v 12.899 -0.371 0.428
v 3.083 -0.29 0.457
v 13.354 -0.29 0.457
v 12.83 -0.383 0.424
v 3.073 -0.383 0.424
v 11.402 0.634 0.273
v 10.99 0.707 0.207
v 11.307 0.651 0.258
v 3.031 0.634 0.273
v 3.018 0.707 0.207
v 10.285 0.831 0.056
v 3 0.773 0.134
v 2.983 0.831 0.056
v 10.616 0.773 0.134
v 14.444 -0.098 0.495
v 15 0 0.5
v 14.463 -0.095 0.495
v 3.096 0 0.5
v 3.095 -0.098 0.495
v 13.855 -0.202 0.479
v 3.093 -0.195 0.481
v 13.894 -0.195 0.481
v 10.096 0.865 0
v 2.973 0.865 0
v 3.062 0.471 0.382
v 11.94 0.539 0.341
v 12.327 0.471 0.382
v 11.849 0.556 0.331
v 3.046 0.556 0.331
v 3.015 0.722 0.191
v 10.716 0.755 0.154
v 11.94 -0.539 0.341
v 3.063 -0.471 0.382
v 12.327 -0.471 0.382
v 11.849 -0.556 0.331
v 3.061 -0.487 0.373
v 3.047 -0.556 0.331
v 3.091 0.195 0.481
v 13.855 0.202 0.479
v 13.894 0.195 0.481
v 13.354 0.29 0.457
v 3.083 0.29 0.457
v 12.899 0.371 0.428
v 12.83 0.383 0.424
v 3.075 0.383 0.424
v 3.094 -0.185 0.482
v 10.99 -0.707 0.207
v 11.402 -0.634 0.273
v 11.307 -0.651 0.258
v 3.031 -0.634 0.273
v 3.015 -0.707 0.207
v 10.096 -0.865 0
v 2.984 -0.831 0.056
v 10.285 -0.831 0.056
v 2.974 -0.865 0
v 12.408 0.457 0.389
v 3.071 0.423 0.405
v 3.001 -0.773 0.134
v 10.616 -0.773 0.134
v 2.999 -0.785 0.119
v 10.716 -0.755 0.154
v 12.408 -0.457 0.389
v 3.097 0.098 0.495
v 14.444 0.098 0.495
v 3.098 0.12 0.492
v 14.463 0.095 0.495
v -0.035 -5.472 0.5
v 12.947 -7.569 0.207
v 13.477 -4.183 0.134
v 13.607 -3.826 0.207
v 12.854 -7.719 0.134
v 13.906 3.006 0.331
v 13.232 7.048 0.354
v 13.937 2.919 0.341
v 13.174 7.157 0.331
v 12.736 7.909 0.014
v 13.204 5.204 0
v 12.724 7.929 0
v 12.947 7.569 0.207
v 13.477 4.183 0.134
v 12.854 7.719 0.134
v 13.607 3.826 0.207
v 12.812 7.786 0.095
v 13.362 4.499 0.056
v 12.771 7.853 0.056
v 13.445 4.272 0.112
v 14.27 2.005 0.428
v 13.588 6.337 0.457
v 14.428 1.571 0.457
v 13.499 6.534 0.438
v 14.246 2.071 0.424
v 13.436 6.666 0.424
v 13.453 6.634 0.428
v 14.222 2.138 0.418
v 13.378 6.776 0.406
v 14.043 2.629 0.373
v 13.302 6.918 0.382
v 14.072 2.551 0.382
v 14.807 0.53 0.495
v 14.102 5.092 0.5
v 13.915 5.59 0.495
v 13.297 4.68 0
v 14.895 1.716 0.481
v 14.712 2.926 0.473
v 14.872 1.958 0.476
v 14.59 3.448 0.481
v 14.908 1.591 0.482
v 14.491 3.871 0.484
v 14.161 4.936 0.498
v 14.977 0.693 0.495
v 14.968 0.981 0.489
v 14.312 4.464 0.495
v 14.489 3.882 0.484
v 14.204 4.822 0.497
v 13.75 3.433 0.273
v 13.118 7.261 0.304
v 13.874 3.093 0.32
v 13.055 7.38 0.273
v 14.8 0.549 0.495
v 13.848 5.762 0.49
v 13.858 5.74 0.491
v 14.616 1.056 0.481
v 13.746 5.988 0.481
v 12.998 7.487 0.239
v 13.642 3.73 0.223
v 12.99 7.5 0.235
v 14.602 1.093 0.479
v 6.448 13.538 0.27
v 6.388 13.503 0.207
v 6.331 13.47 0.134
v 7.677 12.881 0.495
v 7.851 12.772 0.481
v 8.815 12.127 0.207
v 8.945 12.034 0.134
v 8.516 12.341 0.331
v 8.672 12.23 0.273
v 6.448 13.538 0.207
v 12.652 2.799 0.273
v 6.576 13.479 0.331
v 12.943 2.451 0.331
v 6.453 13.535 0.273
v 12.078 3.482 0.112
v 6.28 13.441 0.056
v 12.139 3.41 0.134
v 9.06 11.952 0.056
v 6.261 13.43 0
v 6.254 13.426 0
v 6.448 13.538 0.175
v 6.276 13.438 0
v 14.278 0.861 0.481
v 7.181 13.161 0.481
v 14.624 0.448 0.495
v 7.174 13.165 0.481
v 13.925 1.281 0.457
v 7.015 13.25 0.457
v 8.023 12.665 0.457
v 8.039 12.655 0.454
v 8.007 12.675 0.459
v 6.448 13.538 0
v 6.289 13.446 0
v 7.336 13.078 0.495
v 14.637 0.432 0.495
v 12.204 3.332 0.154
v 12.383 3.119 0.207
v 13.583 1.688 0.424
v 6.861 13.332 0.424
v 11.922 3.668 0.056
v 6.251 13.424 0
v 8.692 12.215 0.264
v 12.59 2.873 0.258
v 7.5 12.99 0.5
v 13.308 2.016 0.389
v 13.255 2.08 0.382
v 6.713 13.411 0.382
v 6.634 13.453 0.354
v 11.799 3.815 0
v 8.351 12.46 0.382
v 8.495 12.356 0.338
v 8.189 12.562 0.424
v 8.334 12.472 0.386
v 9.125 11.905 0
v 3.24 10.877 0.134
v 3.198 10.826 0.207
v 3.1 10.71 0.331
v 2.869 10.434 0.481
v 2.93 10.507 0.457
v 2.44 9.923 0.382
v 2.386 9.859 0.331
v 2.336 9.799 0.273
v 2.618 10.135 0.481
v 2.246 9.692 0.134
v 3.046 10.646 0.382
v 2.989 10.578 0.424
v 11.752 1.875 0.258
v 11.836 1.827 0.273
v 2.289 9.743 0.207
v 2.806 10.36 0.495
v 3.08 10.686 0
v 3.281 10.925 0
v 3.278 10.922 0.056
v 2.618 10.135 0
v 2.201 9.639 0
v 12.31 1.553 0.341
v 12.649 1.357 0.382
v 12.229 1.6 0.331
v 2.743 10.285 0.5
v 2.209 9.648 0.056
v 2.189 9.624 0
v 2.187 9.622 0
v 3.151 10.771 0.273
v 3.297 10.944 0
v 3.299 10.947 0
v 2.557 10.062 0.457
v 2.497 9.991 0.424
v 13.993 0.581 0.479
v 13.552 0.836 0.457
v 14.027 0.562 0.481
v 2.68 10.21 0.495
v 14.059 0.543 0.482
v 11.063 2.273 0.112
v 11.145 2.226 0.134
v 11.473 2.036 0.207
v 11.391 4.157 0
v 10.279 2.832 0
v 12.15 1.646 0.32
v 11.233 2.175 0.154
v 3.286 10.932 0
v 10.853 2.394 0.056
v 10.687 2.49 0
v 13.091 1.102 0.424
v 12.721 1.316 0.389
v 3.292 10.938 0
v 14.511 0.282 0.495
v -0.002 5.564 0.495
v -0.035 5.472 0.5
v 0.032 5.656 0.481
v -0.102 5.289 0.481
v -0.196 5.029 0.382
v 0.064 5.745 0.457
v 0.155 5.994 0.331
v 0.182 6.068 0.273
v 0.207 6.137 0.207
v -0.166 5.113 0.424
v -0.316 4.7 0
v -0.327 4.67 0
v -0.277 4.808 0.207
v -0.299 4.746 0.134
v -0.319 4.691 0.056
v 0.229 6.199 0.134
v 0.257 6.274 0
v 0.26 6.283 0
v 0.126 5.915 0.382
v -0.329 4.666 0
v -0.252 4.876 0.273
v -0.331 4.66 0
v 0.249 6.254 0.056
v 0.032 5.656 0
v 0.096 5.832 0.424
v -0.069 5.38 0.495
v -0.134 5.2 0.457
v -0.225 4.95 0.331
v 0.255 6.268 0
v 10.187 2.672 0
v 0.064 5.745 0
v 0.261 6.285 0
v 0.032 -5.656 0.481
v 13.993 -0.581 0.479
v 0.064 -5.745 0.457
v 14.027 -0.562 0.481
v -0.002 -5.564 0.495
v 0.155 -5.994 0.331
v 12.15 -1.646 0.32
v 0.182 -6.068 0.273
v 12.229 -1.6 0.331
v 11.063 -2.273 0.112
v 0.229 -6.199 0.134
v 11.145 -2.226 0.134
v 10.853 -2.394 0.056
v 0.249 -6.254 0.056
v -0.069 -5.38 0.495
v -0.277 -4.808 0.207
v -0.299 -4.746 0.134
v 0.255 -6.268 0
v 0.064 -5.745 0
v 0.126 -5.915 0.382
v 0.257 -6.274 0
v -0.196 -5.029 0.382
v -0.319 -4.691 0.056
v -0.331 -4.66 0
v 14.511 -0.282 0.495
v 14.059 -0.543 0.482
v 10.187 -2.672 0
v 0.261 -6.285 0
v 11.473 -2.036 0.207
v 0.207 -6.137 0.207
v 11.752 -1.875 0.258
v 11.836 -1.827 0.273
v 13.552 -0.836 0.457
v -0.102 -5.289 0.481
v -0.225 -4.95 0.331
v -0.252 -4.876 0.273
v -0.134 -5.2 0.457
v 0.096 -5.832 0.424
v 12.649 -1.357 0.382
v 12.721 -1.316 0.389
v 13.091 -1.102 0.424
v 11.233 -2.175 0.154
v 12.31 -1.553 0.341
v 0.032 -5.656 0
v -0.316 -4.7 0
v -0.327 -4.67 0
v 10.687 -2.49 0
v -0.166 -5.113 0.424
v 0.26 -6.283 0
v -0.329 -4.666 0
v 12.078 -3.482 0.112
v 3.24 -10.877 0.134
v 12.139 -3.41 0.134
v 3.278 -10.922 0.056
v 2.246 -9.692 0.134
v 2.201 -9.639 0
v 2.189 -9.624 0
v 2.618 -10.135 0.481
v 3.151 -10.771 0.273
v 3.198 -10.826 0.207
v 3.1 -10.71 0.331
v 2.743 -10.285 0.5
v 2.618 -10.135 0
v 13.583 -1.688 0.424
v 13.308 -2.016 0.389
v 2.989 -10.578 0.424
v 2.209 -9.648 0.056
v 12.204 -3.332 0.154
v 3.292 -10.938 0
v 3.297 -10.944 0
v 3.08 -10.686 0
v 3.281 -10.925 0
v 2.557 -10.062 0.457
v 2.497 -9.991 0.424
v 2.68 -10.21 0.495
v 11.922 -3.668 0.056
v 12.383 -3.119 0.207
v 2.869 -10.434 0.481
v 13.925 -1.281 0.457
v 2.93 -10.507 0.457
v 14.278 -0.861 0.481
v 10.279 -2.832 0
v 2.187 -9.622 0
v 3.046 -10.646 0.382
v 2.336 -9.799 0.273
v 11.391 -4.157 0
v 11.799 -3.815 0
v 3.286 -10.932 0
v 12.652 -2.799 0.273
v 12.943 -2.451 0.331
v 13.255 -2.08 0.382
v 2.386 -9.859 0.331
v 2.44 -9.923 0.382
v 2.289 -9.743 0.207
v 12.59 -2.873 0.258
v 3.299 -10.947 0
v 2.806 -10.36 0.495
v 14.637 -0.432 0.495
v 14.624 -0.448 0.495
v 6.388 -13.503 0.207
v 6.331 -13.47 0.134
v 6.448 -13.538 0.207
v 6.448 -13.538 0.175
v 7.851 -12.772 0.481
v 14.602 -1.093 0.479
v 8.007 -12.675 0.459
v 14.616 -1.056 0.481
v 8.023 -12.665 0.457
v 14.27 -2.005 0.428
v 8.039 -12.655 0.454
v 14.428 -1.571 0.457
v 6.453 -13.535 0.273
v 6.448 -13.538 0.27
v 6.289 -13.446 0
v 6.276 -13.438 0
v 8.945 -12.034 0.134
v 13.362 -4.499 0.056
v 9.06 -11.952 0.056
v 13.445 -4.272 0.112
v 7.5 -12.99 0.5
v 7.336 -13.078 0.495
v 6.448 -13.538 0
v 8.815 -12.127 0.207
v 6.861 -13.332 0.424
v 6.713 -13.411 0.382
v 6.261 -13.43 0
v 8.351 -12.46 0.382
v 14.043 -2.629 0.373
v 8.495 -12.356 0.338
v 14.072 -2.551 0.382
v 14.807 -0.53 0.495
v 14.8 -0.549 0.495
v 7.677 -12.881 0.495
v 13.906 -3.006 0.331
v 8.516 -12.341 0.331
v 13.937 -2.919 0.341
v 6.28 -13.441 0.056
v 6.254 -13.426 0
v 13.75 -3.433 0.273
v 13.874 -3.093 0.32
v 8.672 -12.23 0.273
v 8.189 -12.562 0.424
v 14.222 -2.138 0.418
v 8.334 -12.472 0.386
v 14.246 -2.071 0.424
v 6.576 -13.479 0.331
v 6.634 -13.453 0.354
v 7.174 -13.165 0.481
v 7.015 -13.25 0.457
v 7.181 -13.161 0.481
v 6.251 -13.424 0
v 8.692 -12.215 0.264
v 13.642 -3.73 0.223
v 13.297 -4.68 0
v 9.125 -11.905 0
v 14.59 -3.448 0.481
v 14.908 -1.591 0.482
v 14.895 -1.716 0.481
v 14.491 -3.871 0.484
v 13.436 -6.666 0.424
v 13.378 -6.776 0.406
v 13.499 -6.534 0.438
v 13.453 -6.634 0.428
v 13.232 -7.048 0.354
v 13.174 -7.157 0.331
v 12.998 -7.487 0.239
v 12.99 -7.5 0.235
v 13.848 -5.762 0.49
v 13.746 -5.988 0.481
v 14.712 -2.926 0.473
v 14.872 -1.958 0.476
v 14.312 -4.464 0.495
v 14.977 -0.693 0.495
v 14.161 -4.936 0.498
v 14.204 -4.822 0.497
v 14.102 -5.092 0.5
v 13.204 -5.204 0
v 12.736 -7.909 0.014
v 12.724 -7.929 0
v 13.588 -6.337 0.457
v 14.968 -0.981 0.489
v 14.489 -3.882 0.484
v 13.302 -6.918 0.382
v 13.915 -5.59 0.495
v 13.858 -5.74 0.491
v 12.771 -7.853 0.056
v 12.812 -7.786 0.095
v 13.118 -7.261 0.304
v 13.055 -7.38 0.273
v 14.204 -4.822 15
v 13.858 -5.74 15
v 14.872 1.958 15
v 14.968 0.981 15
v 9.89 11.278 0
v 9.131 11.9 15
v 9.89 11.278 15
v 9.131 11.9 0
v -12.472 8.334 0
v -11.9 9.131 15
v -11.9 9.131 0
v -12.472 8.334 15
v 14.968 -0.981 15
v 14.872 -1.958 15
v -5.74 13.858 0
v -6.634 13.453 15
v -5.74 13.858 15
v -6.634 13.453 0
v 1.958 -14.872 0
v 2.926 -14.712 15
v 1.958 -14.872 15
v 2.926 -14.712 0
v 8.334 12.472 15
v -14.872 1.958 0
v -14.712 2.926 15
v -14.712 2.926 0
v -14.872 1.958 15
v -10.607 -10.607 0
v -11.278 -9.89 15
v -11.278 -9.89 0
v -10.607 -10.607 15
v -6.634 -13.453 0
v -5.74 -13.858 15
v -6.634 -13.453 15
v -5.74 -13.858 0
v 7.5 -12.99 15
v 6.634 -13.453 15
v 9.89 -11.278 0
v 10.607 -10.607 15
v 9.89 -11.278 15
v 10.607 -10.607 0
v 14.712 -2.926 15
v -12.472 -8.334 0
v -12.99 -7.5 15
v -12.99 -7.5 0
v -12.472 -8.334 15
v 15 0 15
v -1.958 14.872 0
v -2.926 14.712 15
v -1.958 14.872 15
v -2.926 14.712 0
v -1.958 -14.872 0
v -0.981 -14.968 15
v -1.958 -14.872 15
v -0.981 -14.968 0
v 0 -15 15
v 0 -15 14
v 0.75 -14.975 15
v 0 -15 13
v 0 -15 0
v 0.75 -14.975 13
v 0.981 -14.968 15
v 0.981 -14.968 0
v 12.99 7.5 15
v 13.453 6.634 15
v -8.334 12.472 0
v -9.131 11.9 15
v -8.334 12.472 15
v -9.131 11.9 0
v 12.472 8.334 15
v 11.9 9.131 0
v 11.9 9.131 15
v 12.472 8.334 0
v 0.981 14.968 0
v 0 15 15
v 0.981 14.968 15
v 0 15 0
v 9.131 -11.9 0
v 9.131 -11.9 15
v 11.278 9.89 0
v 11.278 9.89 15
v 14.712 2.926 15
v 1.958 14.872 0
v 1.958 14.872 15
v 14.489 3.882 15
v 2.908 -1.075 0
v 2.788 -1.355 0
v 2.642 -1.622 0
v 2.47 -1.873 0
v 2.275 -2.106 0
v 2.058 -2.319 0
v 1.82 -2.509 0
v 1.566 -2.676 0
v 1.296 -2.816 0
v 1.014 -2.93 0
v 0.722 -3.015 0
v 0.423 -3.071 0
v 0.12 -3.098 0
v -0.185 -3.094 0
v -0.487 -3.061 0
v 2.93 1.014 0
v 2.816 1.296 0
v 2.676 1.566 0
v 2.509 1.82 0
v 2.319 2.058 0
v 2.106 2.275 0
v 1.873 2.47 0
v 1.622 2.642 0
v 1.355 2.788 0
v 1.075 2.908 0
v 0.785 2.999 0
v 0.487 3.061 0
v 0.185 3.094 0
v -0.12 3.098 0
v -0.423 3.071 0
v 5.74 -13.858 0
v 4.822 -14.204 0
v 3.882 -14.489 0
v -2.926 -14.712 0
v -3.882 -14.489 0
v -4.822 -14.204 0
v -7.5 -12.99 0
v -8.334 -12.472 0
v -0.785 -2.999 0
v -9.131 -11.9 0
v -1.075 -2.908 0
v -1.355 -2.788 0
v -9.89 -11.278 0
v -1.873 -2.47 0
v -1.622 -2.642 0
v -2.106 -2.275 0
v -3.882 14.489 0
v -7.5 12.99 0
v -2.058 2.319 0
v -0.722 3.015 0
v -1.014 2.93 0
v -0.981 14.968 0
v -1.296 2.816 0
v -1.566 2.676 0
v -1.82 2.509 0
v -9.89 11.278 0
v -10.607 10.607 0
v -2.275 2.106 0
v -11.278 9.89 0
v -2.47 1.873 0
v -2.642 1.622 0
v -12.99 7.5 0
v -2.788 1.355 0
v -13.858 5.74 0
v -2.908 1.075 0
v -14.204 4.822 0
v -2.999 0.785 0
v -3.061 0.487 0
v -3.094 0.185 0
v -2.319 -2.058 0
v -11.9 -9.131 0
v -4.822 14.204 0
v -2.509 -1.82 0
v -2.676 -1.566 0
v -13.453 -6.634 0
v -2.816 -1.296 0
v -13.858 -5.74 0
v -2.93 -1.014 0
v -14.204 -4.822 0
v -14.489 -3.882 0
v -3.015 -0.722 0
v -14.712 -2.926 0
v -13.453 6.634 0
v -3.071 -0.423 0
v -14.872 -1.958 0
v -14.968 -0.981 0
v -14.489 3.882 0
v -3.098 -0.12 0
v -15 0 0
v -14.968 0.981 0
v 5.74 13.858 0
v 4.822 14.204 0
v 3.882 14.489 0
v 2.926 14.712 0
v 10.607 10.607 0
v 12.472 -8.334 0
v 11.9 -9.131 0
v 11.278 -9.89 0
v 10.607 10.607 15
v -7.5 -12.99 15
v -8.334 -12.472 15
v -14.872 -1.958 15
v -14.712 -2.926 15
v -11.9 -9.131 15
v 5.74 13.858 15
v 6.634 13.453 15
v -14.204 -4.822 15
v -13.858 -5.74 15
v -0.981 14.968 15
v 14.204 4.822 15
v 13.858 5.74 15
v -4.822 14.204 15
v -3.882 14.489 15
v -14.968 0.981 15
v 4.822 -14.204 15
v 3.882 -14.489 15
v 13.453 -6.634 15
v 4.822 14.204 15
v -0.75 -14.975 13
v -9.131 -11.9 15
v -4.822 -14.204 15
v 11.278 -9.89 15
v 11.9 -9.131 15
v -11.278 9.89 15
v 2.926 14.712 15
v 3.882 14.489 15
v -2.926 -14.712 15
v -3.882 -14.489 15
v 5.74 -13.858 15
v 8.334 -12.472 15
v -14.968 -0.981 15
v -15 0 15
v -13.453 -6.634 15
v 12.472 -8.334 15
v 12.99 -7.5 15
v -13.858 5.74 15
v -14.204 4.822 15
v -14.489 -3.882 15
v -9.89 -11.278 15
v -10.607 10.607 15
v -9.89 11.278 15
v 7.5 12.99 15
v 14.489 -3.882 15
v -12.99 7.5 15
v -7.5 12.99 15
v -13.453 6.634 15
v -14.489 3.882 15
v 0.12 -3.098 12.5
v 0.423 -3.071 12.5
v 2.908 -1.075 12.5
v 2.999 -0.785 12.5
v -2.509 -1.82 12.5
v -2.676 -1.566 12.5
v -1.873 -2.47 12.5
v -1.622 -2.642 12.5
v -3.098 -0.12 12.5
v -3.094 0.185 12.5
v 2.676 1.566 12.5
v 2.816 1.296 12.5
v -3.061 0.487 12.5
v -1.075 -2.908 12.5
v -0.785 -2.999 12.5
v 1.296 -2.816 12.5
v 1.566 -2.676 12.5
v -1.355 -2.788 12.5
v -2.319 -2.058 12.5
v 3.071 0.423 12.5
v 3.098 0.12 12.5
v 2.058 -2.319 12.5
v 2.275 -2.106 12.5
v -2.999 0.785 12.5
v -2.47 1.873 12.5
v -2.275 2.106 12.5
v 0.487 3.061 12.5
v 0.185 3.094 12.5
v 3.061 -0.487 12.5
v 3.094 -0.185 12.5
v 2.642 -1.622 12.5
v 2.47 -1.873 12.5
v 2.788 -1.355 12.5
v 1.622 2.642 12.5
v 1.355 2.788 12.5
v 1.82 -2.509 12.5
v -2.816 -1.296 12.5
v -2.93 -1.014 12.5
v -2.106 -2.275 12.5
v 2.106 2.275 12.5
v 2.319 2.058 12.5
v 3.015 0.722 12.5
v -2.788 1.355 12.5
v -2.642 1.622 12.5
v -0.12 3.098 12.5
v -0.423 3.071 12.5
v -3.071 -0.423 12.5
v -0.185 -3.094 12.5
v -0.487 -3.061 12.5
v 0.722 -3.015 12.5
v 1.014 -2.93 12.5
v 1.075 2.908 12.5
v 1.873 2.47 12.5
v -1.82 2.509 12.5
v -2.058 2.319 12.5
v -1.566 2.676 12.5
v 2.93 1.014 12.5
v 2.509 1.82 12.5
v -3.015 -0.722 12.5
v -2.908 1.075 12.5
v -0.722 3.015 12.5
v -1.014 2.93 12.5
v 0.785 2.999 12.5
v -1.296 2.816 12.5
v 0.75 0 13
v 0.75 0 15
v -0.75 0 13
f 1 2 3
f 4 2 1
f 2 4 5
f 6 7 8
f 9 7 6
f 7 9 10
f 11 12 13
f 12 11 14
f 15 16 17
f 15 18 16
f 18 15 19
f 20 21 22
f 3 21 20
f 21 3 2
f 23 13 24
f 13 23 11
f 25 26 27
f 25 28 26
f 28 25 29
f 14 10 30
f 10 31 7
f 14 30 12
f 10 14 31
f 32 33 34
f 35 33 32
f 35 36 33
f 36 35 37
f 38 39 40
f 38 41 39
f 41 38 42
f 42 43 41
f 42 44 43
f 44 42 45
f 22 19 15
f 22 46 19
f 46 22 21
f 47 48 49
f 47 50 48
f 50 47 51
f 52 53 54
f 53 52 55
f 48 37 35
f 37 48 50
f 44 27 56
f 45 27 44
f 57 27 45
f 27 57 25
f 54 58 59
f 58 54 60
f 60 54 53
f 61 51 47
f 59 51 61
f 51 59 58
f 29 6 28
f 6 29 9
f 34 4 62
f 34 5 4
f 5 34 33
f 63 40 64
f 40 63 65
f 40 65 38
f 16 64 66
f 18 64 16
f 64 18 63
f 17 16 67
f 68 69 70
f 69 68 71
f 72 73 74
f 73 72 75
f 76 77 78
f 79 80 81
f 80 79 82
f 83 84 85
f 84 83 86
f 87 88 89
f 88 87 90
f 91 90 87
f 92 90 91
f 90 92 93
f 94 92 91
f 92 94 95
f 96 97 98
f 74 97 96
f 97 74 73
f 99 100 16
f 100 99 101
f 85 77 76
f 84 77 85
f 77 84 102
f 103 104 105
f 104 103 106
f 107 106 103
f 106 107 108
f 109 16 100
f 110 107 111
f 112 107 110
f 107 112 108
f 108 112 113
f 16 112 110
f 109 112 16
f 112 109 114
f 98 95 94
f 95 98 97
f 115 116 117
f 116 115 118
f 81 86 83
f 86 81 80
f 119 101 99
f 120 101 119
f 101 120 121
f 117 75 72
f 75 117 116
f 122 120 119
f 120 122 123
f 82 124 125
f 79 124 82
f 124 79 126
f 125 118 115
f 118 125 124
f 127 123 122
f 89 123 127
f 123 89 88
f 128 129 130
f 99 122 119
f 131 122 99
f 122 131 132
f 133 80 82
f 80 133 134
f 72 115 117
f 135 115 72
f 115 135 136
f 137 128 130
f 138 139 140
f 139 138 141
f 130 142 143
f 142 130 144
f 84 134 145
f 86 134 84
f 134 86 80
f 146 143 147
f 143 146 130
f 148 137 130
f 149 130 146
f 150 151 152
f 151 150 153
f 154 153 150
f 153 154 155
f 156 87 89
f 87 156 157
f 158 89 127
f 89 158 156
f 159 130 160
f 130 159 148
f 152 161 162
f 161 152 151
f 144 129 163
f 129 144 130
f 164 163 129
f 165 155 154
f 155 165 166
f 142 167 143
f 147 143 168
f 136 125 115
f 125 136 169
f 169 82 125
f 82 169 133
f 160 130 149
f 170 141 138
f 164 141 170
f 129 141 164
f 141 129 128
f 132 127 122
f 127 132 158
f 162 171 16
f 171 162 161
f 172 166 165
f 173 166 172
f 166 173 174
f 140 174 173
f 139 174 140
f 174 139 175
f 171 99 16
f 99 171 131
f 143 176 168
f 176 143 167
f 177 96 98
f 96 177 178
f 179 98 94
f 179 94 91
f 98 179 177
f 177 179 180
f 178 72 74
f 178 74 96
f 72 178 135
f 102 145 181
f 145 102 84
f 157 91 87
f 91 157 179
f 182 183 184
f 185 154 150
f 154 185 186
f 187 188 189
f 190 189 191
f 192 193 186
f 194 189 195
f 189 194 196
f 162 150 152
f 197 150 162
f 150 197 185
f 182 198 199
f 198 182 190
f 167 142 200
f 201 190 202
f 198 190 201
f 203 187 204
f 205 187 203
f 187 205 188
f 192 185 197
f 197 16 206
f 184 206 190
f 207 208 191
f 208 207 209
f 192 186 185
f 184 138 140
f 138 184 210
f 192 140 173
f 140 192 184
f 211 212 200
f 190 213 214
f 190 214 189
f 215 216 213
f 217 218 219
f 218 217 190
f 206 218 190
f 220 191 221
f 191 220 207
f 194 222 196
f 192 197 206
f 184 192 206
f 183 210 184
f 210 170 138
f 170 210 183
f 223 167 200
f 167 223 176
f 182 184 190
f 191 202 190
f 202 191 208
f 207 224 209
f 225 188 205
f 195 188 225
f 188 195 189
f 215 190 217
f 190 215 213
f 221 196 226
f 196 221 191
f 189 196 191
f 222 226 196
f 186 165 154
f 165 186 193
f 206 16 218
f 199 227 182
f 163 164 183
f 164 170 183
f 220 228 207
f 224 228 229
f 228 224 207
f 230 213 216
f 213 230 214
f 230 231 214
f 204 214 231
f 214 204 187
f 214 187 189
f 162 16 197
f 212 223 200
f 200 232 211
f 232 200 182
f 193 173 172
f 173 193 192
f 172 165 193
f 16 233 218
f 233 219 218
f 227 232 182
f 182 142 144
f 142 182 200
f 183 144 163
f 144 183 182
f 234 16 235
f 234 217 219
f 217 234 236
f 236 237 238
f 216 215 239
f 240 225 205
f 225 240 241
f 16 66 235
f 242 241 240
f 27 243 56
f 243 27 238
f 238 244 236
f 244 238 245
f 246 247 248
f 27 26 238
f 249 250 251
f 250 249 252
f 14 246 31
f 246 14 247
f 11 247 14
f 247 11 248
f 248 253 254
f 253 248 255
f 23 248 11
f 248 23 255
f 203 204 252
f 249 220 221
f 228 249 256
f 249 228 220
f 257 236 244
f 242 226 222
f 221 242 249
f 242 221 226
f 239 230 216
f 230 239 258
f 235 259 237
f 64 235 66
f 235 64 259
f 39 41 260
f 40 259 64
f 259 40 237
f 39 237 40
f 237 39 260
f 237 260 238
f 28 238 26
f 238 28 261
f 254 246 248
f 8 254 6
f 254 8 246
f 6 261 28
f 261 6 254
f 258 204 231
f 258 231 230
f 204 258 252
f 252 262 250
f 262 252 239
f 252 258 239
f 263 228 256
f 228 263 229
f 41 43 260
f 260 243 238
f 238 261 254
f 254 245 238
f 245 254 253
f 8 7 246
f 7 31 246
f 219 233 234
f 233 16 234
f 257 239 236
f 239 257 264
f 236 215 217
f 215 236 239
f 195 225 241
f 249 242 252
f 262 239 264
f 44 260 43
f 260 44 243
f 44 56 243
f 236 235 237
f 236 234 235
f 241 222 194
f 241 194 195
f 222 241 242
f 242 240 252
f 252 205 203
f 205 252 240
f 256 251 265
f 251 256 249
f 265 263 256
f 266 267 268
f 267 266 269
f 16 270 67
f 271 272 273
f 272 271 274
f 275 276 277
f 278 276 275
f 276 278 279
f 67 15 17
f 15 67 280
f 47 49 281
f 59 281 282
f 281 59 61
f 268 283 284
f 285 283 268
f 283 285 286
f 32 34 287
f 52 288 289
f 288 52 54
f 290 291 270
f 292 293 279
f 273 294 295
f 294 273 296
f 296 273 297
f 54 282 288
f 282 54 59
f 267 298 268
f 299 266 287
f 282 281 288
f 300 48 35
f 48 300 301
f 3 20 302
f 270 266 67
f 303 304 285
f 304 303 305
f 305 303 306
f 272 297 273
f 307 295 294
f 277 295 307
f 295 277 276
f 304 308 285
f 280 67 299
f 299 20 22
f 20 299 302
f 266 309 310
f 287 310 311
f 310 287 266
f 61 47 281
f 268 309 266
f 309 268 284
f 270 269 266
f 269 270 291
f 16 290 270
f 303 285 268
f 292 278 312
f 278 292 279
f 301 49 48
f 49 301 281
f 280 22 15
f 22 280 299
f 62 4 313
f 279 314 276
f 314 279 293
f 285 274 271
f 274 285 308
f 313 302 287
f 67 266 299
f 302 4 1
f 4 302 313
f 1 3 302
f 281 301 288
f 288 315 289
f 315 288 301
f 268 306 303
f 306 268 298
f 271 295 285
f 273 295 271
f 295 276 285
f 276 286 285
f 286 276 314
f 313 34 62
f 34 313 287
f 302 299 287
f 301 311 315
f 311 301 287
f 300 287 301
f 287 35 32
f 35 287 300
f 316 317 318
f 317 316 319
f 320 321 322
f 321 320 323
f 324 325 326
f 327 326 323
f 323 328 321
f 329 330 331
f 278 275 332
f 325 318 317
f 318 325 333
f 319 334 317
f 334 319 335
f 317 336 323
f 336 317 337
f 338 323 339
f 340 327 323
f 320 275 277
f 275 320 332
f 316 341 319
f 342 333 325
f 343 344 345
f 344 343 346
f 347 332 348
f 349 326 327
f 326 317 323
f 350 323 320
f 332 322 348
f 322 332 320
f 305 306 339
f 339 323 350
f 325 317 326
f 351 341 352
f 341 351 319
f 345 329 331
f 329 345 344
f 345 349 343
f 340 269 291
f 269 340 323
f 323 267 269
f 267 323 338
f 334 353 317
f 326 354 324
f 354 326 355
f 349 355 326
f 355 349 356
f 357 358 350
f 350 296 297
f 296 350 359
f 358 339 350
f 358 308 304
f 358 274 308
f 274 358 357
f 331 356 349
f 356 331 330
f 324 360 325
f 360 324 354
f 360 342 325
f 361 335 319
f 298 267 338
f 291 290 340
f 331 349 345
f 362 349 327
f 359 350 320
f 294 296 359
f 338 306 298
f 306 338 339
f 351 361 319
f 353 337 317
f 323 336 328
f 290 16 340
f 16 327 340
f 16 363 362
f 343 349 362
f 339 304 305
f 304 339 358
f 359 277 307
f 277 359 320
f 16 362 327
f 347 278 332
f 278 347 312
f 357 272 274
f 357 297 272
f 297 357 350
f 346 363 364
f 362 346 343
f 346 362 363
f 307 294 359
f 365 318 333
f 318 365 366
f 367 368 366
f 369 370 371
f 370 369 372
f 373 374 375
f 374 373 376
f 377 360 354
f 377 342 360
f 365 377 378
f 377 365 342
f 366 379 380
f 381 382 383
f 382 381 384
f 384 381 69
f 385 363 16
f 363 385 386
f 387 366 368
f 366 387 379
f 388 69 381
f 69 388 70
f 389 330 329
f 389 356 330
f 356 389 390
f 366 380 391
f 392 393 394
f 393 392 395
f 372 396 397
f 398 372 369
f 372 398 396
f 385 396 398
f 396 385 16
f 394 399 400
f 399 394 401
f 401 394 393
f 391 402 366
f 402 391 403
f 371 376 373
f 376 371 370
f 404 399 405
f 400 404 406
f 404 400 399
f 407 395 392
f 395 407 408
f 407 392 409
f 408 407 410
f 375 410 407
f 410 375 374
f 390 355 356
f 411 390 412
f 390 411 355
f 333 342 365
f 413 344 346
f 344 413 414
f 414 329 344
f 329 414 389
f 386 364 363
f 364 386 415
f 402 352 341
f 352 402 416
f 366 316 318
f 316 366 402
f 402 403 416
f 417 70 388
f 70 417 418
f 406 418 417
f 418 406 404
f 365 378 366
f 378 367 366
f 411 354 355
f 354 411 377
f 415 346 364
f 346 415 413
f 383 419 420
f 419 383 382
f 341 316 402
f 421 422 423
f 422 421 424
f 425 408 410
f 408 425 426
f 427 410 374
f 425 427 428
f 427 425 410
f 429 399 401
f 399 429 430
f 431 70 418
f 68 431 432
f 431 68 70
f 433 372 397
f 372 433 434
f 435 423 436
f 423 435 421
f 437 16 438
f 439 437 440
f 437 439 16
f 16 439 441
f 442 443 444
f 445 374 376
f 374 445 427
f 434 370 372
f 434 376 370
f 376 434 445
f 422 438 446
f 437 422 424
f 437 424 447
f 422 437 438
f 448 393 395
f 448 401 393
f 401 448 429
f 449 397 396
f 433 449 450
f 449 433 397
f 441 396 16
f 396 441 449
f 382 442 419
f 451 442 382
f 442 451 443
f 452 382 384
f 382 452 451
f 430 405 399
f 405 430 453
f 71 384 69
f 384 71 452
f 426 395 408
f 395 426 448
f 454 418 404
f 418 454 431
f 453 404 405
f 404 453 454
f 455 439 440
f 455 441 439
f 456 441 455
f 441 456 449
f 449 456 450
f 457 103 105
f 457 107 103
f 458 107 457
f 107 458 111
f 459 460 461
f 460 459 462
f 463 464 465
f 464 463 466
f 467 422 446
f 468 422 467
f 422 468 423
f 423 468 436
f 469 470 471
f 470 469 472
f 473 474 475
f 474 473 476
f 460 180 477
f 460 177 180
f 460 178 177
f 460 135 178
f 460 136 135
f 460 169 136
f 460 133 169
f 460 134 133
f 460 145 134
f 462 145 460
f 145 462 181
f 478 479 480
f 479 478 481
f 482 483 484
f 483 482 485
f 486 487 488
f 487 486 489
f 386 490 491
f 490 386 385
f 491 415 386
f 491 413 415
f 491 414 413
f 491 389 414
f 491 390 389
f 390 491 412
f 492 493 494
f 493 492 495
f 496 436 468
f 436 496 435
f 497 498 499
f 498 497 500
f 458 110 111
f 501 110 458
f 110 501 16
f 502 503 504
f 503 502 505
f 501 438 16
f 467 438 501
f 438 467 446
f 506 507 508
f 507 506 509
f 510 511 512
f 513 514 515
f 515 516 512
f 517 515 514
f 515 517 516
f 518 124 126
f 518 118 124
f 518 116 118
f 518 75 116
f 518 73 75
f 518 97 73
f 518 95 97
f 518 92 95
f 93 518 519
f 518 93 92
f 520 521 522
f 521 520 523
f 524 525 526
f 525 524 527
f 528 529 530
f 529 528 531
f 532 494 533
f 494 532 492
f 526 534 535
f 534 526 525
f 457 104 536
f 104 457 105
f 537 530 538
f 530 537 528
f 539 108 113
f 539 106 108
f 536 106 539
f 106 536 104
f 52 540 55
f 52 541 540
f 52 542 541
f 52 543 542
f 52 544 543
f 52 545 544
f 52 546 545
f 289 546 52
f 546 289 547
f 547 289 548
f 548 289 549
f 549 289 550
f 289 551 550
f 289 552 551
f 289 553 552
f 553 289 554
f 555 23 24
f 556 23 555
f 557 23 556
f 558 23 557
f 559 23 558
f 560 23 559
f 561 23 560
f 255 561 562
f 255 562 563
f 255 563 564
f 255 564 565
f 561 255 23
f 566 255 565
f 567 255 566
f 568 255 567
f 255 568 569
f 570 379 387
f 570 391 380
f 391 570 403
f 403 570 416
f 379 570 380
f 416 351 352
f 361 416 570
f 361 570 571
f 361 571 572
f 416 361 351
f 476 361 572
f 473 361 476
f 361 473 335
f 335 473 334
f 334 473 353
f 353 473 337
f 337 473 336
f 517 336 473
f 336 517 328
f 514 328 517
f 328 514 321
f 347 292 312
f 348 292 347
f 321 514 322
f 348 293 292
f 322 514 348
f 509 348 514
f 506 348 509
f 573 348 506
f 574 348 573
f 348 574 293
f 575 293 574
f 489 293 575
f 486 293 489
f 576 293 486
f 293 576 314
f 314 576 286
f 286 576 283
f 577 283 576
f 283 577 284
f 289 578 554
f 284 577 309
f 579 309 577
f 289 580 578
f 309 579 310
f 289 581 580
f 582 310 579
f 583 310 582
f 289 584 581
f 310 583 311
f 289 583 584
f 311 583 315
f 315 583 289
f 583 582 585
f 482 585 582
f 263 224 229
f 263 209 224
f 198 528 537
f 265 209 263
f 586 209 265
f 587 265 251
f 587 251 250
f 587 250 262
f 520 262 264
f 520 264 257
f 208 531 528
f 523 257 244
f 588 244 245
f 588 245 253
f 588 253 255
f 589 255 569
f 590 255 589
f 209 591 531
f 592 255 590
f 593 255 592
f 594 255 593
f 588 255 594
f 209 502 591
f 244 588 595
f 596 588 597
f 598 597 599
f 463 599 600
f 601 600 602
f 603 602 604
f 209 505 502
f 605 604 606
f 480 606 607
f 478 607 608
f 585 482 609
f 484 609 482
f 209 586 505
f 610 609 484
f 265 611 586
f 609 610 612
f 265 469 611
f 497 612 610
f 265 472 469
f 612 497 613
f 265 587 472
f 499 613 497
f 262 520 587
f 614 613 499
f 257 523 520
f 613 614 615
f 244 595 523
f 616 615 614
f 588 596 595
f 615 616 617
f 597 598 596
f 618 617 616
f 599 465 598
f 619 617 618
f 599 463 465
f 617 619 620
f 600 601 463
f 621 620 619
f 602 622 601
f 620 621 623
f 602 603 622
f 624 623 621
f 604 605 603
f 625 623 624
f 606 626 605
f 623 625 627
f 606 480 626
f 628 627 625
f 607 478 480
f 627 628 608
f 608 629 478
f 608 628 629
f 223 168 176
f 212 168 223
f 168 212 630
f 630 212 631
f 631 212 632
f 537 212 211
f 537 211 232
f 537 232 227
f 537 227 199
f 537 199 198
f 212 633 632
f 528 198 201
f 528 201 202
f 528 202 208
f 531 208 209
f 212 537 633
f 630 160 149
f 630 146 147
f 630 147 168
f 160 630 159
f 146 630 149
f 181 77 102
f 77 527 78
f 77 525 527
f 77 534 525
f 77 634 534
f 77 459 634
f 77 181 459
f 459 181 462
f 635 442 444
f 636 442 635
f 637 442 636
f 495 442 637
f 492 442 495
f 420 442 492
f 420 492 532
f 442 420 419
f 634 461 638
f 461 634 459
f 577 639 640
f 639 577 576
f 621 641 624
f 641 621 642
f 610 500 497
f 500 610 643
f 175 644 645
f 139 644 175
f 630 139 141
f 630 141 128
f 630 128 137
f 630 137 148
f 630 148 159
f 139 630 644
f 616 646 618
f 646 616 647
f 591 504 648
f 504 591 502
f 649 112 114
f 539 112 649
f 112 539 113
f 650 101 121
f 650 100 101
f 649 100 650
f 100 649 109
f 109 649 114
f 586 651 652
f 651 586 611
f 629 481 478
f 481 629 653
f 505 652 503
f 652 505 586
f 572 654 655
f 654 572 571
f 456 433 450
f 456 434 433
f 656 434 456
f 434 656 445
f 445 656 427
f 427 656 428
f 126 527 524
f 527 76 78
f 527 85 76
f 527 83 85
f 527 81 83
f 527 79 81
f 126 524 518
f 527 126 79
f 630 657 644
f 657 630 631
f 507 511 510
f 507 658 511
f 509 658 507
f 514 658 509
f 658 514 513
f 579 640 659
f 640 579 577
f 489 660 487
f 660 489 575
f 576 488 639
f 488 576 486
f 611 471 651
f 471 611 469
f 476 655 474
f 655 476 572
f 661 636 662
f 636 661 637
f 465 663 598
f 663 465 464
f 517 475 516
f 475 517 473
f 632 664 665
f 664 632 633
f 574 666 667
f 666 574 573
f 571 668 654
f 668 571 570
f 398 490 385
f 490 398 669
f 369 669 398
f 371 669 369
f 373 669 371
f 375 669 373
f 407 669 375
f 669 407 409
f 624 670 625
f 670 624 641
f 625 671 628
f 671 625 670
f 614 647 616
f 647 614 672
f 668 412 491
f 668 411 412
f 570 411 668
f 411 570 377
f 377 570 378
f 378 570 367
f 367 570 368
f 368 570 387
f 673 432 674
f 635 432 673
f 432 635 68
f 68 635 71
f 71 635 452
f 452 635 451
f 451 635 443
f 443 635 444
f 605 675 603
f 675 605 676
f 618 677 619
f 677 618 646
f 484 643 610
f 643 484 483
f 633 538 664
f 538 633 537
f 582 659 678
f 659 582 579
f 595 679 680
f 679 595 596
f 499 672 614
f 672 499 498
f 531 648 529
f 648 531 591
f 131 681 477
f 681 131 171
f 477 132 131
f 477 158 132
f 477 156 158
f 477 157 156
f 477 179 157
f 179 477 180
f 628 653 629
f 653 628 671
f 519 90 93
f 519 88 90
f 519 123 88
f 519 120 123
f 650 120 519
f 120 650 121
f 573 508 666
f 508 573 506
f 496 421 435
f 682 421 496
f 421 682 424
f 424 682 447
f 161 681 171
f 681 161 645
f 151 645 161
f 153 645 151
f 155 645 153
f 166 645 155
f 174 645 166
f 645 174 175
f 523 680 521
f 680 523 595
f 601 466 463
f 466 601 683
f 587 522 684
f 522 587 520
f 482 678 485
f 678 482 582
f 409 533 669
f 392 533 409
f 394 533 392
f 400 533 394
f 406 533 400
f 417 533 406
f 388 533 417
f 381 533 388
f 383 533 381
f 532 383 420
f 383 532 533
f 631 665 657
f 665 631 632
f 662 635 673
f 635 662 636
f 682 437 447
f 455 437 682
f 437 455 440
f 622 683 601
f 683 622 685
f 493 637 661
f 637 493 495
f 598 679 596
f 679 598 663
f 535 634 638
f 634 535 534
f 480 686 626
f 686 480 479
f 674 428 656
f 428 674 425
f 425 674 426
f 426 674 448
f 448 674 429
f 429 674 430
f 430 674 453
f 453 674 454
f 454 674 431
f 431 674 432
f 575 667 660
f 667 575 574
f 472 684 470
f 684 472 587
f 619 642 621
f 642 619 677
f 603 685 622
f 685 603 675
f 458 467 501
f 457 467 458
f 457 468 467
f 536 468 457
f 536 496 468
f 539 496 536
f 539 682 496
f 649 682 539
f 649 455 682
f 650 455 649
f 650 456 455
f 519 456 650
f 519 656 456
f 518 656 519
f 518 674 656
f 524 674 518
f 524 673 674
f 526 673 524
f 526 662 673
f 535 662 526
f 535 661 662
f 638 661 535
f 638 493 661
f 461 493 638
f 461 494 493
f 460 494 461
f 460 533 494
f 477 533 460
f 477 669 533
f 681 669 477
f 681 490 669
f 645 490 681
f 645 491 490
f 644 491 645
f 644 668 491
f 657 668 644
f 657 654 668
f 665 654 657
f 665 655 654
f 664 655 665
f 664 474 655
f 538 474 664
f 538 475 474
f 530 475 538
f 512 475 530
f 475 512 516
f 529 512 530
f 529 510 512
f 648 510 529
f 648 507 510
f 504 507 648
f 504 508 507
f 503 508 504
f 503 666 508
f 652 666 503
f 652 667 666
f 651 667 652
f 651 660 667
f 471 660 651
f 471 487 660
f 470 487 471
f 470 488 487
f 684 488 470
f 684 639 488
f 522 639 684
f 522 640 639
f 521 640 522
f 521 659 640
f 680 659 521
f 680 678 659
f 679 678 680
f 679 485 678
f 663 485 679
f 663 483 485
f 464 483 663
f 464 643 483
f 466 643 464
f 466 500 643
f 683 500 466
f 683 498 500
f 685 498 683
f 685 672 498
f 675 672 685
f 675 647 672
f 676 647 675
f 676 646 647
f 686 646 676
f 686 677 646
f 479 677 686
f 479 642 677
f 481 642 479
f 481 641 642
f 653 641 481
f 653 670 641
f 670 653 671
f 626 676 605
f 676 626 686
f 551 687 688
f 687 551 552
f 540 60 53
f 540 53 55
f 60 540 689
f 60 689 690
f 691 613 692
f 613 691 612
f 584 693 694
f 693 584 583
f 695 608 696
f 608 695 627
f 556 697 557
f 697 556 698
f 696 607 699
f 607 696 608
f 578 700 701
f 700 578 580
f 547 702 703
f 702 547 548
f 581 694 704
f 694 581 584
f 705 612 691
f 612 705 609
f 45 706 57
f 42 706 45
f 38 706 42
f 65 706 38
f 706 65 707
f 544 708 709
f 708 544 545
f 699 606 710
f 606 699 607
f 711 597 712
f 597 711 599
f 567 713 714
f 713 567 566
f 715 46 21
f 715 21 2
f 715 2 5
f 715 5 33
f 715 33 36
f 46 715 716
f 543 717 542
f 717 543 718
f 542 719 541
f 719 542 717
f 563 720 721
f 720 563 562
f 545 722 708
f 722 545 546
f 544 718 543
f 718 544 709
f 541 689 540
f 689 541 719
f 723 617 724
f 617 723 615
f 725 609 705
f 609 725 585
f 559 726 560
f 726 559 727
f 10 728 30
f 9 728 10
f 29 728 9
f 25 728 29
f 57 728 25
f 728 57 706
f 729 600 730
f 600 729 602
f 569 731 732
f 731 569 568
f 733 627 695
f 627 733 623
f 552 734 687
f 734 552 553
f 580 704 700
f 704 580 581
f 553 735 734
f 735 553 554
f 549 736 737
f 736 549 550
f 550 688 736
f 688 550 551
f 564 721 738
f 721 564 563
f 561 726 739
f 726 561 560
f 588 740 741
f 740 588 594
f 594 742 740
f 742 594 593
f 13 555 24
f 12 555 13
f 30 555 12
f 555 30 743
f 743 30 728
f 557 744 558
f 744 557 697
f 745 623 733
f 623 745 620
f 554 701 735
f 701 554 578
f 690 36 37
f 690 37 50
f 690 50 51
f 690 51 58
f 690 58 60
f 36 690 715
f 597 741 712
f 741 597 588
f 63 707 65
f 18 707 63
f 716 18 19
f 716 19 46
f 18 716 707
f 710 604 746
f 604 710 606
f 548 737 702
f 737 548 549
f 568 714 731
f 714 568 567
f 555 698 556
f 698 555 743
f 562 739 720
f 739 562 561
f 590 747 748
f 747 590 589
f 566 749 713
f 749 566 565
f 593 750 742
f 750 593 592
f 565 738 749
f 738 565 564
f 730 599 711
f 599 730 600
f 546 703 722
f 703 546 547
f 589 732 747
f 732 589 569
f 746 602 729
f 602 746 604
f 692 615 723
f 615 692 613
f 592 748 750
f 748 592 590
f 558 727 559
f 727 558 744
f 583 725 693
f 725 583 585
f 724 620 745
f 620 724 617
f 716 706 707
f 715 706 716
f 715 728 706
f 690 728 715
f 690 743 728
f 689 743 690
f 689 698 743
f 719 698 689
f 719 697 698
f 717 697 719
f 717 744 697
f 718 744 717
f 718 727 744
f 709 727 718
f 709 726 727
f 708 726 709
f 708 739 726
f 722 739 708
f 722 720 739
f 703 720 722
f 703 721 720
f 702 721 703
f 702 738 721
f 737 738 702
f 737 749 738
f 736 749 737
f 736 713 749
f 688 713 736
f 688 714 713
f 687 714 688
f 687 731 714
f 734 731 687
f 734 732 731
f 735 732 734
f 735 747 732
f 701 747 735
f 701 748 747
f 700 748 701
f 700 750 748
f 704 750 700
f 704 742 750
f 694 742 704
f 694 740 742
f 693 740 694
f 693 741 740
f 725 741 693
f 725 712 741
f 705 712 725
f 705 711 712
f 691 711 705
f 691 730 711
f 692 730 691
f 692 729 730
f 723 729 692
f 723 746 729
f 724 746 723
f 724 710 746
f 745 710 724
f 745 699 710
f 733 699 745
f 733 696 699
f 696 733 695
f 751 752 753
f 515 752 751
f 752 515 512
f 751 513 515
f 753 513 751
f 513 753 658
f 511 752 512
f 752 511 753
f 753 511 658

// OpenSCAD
// Replacement knob for a hotplate stirrer with a 6 mm D-shaft
// Print orientation: bottom face (with D-bore) on the bed at z = 0

$fn = 96;

// ---- Dimensions (mm) ----
knob_d      = 30;    // knob outer diameter
knob_h      = 15;    // knob height
bore_d      = 6.2;   // D-bore circle diameter
bore_depth  = 12;    // D-bore depth from bottom face
bore_flat   = 4.7;   // distance from D-bore flat to opposite side
groove_n    = 18;    // number of vertical grip grooves
groove_d    = 2;     // grip groove diameter (half-cylinder)
pointer_w   = 1.5;   // pointer groove width
pointer_d   = 1;     // pointer groove depth
eps         = 0.5;   // overcut for clean boolean differences

// ---- Derived ----
bore_r = bore_d / 2;
start_angle = atan2(-bore_flat / 2, bore_r);  // flat on +X side

difference() {
    // Main body: cylinder, centred in XY, resting on z = 0
    translate([0, 0, 0])
        cylinder(d = knob_d, h = knob_h);

    // D-shaped blind bore from bottom face
    translate([0, 0, -eps])
        rotate([0, 0, start_angle])
            cylinder(r = bore_r, h = bore_depth + 2 * eps, $fn = 64);

    // 18 vertical grip grooves along the full height
    for (i = [0 : groove_n - 1])
        translate([knob_d / 2, 0, -eps])
            rotate([0, 90, i * 360 / groove_n])
                cylinder(d = groove_d, h = knob_h + 2 * eps, $fn = 64);

    // Pointer groove on top face, from centre to outer edge
    translate([0, 0, knob_h - pointer_d])
        rotate([90, 0, 0])
            linear_extrude(height = knob_d / 2)
                polygon([[-pointer_w / 2, -1], [pointer_w / 2, -1], [pointer_w / 2, 1]]);
}
